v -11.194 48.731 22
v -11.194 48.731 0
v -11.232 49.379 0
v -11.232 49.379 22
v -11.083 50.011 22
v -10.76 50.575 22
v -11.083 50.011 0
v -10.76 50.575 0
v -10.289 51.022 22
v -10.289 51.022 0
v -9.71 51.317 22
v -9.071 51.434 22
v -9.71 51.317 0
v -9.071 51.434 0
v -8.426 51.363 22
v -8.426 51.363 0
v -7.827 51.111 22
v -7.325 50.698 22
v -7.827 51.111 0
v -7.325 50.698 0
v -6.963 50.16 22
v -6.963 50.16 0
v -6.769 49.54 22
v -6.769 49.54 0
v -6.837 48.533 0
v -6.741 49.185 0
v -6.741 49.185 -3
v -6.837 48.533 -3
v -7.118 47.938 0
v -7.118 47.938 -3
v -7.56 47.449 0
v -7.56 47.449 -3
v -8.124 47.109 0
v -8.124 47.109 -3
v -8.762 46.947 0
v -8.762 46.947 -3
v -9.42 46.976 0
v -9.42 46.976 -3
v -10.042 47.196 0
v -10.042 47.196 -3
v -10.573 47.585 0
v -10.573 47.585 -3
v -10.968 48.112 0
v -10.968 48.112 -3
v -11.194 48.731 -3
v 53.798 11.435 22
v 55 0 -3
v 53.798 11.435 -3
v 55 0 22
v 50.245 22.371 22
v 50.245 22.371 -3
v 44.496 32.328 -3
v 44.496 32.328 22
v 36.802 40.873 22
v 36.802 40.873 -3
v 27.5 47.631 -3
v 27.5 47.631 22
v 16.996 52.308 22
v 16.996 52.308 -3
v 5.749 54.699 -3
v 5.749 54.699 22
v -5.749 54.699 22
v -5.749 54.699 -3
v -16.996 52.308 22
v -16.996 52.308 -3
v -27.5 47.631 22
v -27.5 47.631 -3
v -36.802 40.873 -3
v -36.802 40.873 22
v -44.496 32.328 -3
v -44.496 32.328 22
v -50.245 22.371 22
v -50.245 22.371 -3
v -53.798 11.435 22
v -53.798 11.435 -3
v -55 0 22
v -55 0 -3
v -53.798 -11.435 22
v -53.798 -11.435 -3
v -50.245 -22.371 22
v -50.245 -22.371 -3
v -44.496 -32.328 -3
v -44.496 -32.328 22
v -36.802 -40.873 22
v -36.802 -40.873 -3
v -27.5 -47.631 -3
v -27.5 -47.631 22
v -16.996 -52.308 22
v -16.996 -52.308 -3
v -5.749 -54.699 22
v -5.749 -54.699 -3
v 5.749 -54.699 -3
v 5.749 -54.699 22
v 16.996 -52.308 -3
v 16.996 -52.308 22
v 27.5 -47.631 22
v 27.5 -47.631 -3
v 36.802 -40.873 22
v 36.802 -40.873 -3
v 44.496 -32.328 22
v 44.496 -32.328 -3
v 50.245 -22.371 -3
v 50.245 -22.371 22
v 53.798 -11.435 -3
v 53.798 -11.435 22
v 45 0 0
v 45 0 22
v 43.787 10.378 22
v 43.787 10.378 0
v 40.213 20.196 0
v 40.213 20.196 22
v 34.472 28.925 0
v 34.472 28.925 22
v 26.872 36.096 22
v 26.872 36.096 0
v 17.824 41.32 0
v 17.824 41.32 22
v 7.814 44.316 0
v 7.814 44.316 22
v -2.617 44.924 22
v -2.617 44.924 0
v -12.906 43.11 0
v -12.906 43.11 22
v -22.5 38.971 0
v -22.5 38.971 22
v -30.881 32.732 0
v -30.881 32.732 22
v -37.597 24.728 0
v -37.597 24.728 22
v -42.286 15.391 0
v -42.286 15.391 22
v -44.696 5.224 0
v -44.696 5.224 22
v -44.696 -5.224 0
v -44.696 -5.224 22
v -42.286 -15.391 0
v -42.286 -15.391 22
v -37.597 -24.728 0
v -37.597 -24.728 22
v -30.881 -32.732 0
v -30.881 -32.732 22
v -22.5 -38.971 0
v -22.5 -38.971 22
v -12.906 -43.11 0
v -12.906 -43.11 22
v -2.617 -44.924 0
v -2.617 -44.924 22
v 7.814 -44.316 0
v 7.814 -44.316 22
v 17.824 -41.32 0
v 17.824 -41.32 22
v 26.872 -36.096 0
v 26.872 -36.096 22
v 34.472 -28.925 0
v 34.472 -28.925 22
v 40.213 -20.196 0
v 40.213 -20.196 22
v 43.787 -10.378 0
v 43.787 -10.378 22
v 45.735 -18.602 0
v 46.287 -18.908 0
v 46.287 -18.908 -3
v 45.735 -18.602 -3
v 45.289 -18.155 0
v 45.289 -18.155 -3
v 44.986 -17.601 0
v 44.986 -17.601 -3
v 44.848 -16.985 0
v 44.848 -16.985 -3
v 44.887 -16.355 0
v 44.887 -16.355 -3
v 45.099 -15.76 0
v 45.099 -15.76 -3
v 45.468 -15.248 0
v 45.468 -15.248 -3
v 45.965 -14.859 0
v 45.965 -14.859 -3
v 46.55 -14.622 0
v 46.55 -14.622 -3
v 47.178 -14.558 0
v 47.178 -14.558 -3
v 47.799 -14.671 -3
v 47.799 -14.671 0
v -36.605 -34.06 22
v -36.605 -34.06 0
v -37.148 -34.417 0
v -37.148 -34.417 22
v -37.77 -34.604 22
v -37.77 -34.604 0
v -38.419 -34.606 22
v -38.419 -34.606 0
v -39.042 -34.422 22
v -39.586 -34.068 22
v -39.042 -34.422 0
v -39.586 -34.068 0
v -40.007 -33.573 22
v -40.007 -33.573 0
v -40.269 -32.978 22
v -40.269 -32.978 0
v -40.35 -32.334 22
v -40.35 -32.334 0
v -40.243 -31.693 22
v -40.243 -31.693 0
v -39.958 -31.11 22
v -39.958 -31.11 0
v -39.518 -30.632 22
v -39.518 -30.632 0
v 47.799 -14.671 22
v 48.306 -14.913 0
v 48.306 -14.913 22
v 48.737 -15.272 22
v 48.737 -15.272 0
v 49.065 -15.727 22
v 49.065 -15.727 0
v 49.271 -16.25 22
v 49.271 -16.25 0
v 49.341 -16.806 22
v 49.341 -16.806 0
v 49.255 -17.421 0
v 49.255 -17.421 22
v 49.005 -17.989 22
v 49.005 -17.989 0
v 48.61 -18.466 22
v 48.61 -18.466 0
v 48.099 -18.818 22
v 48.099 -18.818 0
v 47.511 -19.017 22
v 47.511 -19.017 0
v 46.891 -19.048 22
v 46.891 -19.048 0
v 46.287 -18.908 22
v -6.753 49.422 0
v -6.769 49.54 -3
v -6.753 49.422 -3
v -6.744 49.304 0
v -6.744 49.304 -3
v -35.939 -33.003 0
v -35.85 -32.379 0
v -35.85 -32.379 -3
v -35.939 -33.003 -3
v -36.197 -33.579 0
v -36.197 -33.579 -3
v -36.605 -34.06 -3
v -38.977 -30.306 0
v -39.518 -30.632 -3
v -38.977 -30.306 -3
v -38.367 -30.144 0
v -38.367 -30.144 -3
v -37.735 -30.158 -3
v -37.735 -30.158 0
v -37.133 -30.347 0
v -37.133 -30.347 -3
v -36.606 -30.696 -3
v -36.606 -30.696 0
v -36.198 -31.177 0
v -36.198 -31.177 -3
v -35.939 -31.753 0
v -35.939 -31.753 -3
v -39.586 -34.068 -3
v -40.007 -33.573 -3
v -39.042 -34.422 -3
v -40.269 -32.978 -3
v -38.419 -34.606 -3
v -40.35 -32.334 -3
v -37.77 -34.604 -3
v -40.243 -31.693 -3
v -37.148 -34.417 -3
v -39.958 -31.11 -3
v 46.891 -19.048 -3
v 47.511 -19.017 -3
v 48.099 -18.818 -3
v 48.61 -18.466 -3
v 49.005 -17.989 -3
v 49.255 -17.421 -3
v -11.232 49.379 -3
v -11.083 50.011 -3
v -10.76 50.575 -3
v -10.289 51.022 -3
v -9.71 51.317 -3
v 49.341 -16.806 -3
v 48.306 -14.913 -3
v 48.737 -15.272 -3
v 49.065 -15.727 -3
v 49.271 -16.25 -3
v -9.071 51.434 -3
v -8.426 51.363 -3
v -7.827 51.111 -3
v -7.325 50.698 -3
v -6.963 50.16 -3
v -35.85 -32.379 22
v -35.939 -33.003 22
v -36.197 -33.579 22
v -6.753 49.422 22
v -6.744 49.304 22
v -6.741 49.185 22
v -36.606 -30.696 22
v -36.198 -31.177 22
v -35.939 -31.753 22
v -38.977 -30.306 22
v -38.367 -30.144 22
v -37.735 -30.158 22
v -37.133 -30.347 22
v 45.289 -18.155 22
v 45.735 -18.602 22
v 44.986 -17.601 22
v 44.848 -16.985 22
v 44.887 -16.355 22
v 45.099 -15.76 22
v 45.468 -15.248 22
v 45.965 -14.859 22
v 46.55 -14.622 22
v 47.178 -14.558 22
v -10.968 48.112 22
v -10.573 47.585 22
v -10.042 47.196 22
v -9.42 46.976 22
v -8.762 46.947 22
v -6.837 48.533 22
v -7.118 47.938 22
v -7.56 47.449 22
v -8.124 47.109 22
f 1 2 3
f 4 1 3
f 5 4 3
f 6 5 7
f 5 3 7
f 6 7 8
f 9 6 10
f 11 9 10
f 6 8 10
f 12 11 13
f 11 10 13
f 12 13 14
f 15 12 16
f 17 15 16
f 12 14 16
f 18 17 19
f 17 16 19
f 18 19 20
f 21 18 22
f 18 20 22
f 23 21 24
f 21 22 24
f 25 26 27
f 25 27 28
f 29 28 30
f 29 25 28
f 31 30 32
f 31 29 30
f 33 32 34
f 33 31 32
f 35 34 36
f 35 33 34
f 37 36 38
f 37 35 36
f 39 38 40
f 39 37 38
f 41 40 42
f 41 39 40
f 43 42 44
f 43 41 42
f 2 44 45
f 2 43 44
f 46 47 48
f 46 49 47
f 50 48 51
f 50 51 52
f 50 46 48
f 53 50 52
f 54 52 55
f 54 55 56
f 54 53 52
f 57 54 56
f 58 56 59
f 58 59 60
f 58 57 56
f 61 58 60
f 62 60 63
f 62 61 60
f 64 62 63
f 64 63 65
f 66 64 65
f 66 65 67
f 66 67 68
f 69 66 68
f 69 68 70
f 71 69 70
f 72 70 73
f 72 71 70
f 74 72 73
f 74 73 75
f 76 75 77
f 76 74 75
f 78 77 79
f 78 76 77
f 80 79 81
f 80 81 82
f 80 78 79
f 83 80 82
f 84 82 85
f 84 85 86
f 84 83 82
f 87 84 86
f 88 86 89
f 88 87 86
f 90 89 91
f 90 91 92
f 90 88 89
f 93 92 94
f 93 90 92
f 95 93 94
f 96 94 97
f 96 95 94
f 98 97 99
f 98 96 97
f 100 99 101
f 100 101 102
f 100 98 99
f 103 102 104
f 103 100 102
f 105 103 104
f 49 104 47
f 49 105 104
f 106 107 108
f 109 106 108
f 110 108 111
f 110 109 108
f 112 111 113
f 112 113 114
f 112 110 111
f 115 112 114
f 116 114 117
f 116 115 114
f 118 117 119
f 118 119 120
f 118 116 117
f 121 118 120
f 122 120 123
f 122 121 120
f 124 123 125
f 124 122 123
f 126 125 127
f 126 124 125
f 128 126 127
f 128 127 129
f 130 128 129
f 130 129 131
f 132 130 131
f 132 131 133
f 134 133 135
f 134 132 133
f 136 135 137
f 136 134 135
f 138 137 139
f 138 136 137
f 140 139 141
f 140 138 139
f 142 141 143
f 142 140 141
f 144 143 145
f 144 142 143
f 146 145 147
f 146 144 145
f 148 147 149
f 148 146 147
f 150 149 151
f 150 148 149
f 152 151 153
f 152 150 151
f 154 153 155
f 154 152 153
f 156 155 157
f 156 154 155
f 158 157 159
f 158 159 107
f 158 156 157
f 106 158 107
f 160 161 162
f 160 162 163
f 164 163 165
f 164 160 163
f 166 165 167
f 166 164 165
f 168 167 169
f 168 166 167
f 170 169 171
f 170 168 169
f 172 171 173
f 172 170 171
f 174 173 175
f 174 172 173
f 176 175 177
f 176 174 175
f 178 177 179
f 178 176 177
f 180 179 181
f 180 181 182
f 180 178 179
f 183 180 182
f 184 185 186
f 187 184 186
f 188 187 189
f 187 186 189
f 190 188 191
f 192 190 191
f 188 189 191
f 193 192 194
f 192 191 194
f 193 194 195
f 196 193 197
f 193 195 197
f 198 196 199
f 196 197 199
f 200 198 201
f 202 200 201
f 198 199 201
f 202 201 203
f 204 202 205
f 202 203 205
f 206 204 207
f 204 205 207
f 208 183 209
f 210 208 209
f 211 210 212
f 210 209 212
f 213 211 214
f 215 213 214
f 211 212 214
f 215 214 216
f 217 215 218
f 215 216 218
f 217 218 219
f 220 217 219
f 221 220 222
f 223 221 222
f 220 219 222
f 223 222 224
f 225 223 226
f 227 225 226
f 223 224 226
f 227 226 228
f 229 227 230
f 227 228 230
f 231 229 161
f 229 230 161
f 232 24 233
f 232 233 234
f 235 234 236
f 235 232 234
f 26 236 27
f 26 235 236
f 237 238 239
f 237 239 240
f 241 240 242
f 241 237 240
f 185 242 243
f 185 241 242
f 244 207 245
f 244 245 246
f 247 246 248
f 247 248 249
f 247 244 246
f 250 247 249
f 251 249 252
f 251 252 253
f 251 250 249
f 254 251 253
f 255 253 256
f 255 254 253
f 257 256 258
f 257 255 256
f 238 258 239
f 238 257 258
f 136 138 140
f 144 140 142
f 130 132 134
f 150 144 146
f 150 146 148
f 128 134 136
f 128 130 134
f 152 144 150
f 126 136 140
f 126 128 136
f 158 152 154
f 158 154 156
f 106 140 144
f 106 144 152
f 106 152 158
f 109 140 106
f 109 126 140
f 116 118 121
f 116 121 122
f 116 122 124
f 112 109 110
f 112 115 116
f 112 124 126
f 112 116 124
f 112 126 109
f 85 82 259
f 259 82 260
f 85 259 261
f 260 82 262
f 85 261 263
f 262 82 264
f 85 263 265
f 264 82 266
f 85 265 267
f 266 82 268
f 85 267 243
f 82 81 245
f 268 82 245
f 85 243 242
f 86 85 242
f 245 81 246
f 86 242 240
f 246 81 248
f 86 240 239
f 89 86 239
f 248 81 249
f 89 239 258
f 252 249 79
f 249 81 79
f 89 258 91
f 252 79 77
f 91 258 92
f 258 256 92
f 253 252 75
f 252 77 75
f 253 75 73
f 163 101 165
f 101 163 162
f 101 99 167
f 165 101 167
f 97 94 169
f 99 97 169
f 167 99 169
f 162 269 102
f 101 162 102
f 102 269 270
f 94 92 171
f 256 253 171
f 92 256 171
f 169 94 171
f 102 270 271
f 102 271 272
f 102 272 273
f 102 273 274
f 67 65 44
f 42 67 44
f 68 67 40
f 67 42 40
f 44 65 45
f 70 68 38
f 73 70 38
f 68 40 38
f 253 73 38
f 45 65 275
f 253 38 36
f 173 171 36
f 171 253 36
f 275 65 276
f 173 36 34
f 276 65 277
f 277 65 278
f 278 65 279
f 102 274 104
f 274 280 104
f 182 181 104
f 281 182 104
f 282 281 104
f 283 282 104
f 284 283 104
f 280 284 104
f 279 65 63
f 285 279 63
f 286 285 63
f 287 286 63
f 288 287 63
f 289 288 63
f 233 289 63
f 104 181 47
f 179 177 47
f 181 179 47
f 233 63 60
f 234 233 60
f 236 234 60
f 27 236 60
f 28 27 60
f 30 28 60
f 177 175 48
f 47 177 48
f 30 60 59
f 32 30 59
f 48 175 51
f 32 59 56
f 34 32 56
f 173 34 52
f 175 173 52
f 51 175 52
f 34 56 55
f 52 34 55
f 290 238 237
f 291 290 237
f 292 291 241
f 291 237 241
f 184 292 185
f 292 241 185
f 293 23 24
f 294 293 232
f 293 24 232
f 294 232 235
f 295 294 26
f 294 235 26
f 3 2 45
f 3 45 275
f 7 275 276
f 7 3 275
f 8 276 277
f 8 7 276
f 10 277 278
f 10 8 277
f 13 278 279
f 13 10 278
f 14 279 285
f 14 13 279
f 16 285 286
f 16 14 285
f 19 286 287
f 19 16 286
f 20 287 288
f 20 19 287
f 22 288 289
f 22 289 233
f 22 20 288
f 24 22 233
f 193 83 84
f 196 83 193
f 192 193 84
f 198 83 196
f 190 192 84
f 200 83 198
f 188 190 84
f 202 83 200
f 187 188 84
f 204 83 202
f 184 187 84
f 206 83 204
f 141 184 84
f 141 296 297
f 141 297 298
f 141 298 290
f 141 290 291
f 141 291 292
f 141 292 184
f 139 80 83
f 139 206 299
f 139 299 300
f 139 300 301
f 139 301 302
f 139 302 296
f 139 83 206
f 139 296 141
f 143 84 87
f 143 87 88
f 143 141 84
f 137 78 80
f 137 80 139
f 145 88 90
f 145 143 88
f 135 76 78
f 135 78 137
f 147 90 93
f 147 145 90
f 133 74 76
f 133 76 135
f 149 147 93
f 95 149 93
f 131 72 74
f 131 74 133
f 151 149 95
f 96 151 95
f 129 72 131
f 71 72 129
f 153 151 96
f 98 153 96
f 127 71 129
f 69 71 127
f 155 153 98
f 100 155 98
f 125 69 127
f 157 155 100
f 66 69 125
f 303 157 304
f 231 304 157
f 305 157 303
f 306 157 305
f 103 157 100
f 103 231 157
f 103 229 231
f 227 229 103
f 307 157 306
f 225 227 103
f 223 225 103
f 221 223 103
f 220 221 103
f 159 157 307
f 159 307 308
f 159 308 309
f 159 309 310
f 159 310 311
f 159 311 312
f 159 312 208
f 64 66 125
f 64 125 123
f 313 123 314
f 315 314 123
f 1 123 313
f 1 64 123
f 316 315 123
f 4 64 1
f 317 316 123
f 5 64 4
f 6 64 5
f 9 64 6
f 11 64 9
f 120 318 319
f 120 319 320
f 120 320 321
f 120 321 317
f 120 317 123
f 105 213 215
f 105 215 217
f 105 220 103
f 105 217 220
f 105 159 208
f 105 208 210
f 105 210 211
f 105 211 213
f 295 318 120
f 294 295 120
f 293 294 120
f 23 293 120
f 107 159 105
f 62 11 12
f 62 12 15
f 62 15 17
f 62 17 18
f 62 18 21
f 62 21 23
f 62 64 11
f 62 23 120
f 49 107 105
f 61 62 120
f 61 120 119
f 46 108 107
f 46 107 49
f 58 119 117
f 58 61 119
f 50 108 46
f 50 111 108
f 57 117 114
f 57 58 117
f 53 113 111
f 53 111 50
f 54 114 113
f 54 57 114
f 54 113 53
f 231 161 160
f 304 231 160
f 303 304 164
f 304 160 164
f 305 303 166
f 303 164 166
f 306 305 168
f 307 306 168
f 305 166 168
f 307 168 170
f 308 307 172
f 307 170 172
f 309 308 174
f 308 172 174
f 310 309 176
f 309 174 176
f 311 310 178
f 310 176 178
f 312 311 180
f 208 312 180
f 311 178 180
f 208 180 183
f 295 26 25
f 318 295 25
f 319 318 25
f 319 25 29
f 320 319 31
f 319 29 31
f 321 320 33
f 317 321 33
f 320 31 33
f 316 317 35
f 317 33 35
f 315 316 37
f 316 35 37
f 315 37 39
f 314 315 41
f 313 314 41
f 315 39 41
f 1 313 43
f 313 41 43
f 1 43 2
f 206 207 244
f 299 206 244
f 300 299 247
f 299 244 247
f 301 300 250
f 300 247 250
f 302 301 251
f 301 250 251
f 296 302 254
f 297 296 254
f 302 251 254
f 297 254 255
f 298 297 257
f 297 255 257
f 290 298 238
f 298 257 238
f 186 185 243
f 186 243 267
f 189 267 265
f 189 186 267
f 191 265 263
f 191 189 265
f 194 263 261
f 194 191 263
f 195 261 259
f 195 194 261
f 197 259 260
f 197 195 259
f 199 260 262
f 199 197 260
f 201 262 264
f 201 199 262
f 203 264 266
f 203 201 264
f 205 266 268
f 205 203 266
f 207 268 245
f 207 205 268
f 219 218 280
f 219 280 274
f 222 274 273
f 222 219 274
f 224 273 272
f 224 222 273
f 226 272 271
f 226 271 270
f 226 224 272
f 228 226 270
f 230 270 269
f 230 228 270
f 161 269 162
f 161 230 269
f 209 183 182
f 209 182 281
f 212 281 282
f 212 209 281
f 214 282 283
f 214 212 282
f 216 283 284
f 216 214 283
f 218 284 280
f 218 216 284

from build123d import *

# Parameters (mm, degrees)
F0_R     = 55
F0_R_2   = 45
F1_DEPTH = 22
F2_DEPTH = 3


with BuildPart() as f1:
    # F0 (on Top) → F1 (new body)
    with BuildSketch(Plane.XY):
        Circle(F0_R)
        with BuildLine():
            ThreePointArc((-6.7686770228, 49.539731644), (32.8752653895, 37.6724956111), (50, 0))
            ThreePointArc((50, 0), (49.4467404253, -7.417537416), (47.7992055473, -14.6709218881))
            ThreePointArc((47.7992055473, -14.6709218881), (48.9151264842, -15.489568044), (49.3407844988, -16.8064872976))
            ThreePointArc((49.3407844988, -16.8064872976), (48.3663226704, -18.6599981211), (46.2870046118, -18.9080195703))
            ThreePointArc((46.2870046118, -18.9080195703), (8.9905473014, -49.1850593089), (-36.6049938257, -34.0598653406))
            ThreePointArc((-36.6049938257, -34.0598653406), (-39.8147478714, -33.8356077519), (-39.518327589, -30.6317120738))
            ThreePointArc((-39.518327589, -30.6317120738), (-47.0907844988, 16.8064872976), (-11.1942117216, 48.7307872287))
            ThreePointArc((-11.1942117216, 48.7307872287), (-9.3951219299, 51.3983869778), (-6.7686770228, 49.539731644))
        make_face(mode=Mode.SUBTRACT)
        with BuildLine():
            ThreePointArc((47.7992055473, -14.6709218881), (49.4467404253, -7.417537416), (50, 0))
            ThreePointArc((50, 0), (32.8752653895, 37.6724956111), (-6.7686770228, 49.539731644))
            ThreePointArc((-6.7686770228, 49.539731644), (-6.7475907562, 49.3629523572), (-6.7405473014, 49.1850593089))
            ThreePointArc((-6.7405473014, 49.1850593089), (-8.7622327657, 46.9466731776), (-11.1942117216, 48.7307872287))
            ThreePointArc((-11.1942117216, 48.7307872287), (-47.0907844988, 16.8064872976), (-39.518327589, -30.6317120738))
            ThreePointArc((-39.518327589, -30.6317120738), (-37.1328188239, -30.3471681395), (-35.8502371975, -32.3785720114))
            ThreePointArc((-35.8502371975, -32.3785720114), (-36.0475806765, -33.3000388891), (-36.6049938257, -34.0598653406))
            ThreePointArc((-36.6049938257, -34.0598653406), (8.9905473014, -49.1850593089), (46.2870046118, -18.9080195703))
            ThreePointArc((46.2870046118, -18.9080195703), (44.9716991964, -16.0501953692), (47.7992055473, -14.6709218881))
        make_face()
        Circle(F0_R_2, mode=Mode.SUBTRACT)
    extrude(amount=F1_DEPTH)

    # F0 (on Top) → F2 (join)
    with BuildSketch(Plane.XY):
        Circle(F0_R)
        with BuildLine():
            ThreePointArc((-6.7686770228, 49.539731644), (32.8752653895, 37.6724956111), (50, 0))
            ThreePointArc((50, 0), (49.4467404253, -7.417537416), (47.7992055473, -14.6709218881))
            ThreePointArc((47.7992055473, -14.6709218881), (48.9151264842, -15.489568044), (49.3407844988, -16.8064872976))
            ThreePointArc((49.3407844988, -16.8064872976), (48.3663226704, -18.6599981211), (46.2870046118, -18.9080195703))
            ThreePointArc((46.2870046118, -18.9080195703), (8.9905473014, -49.1850593089), (-36.6049938257, -34.0598653406))
            ThreePointArc((-36.6049938257, -34.0598653406), (-39.8147478714, -33.8356077519), (-39.518327589, -30.6317120738))
            ThreePointArc((-39.518327589, -30.6317120738), (-47.0907844988, 16.8064872976), (-11.1942117216, 48.7307872287))
            ThreePointArc((-11.1942117216, 48.7307872287), (-9.3951219299, 51.3983869778), (-6.7686770228, 49.539731644))
        make_face(mode=Mode.SUBTRACT)
        with BuildLine():
            ThreePointArc((47.7992055473, -14.6709218881), (49.4467404253, -7.417537416), (50, 0))
            ThreePointArc((50, 0), (32.8752653895, 37.6724956111), (-6.7686770228, 49.539731644))
            ThreePointArc((-6.7686770228, 49.539731644), (-6.7475907562, 49.3629523572), (-6.7405473014, 49.1850593089))
            ThreePointArc((-6.7405473014, 49.1850593089), (-8.7622327657, 46.9466731776), (-11.1942117216, 48.7307872287))
            ThreePointArc((-11.1942117216, 48.7307872287), (-47.0907844988, 16.8064872976), (-39.518327589, -30.6317120738))
            ThreePointArc((-39.518327589, -30.6317120738), (-37.1328188239, -30.3471681395), (-35.8502371975, -32.3785720114))
            ThreePointArc((-35.8502371975, -32.3785720114), (-36.0475806765, -33.3000388891), (-36.6049938257, -34.0598653406))
            ThreePointArc((-36.6049938257, -34.0598653406), (8.9905473014, -49.1850593089), (46.2870046118, -18.9080195703))
            ThreePointArc((46.2870046118, -18.9080195703), (44.9716991964, -16.0501953692), (47.7992055473, -14.6709218881))
        make_face()
        Circle(F0_R_2, mode=Mode.SUBTRACT)
        Circle(F0_R_2)
    extrude(amount=-F2_DEPTH)


solid = f1.part
